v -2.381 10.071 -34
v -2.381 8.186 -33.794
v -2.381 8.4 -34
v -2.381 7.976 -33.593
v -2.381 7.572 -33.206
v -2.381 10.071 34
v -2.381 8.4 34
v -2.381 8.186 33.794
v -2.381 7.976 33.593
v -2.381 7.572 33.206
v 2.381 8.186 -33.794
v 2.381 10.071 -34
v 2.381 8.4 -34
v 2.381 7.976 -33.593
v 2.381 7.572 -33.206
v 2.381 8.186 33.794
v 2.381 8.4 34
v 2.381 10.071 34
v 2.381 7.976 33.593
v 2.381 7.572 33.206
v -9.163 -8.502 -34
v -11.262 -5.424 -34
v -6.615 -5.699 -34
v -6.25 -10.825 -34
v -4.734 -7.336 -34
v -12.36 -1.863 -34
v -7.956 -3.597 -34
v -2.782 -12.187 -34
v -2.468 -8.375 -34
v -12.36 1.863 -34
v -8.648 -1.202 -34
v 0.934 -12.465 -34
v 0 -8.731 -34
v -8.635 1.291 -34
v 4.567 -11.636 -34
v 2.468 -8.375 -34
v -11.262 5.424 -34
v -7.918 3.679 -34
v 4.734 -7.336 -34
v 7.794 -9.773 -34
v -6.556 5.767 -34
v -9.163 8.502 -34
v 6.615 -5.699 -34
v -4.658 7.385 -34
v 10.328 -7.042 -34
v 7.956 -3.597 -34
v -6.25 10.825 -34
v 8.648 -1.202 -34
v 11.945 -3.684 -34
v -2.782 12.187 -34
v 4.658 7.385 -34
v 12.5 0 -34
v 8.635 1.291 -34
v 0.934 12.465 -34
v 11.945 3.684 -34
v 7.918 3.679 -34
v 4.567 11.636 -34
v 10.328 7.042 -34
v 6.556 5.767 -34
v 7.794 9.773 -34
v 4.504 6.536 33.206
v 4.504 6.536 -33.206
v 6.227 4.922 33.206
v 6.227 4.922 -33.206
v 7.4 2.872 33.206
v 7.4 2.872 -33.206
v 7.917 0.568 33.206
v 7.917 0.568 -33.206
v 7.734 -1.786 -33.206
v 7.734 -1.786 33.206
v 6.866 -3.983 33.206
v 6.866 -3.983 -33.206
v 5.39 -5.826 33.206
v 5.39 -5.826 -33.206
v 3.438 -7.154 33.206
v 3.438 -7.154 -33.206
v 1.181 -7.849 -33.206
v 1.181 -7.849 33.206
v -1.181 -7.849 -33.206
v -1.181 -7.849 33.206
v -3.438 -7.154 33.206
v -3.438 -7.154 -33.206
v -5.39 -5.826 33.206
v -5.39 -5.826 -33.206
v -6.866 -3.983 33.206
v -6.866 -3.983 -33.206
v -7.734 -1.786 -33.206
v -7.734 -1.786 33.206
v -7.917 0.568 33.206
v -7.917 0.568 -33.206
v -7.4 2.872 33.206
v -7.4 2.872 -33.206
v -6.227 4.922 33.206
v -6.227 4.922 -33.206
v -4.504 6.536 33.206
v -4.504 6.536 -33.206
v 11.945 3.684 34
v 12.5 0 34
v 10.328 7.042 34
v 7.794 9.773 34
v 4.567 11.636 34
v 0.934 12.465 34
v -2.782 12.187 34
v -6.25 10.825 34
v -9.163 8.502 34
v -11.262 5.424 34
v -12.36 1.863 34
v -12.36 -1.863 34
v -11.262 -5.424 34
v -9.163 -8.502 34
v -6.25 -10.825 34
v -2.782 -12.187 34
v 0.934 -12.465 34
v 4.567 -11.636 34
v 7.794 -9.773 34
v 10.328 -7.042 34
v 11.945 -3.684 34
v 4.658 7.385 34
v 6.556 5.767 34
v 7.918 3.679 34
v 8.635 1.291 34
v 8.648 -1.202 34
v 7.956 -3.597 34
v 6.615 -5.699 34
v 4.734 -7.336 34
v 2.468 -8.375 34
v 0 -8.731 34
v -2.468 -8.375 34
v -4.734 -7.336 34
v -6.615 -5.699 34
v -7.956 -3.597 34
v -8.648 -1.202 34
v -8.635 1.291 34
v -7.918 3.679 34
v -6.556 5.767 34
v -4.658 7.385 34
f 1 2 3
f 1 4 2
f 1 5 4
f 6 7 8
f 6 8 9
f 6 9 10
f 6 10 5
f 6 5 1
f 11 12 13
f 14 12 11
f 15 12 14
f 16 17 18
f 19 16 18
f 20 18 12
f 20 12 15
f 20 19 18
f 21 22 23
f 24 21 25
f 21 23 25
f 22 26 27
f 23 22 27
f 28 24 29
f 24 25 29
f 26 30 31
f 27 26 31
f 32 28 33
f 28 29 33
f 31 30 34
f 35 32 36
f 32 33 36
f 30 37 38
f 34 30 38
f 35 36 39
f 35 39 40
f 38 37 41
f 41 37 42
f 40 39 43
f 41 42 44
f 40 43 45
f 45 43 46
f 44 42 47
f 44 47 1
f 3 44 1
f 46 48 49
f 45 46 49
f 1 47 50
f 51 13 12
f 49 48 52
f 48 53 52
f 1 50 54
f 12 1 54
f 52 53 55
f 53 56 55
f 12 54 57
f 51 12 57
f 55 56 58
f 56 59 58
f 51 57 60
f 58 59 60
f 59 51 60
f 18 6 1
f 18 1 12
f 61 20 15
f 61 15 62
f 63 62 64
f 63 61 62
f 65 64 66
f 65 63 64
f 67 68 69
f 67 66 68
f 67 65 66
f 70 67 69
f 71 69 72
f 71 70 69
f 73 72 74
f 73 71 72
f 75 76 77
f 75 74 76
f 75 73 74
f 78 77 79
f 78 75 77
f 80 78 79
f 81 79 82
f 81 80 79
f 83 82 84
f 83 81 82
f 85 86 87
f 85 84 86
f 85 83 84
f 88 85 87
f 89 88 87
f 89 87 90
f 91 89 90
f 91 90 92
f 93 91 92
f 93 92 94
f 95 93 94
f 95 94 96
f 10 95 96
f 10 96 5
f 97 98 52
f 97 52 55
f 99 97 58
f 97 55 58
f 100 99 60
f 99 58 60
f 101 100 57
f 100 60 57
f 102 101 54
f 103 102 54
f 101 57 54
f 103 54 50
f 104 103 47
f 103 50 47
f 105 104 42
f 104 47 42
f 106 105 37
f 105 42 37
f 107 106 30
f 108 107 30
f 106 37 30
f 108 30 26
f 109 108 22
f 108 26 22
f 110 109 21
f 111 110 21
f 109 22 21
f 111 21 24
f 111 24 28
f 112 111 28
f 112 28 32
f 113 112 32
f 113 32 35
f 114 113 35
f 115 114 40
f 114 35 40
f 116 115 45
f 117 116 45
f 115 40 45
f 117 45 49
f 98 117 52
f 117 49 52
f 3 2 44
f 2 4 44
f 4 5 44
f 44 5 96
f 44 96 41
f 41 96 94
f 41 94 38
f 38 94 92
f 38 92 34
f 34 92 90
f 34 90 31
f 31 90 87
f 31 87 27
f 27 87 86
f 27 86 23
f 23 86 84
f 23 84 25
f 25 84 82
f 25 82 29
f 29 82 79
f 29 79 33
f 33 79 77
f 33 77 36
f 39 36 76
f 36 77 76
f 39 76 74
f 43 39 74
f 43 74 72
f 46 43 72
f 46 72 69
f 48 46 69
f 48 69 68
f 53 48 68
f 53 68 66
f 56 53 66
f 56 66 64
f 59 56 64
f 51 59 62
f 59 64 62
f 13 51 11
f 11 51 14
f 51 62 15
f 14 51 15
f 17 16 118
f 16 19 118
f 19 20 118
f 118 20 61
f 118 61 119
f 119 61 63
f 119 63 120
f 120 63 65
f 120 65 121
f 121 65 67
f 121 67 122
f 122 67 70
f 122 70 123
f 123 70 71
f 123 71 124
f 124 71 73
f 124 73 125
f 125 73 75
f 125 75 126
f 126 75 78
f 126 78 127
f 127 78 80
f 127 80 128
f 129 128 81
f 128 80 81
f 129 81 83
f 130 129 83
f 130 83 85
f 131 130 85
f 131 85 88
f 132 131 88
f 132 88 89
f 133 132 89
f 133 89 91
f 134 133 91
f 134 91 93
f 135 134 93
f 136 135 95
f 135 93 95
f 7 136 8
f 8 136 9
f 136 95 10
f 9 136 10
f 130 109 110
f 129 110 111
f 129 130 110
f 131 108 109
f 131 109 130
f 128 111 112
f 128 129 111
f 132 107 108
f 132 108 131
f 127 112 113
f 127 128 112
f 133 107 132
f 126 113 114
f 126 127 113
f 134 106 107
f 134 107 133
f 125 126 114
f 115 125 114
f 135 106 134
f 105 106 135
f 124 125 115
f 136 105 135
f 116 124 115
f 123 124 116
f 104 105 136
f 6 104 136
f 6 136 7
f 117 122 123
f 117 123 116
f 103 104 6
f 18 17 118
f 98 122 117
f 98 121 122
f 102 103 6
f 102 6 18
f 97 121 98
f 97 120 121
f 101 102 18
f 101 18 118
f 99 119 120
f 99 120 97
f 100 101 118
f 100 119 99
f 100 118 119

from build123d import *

# Parameters (mm, degrees)
BOSS_EXTRUDE1_DEPTH      = 34
BOSS_EXTRUDE1_DEPTH_BACK = 34
SKETCH2_R                = 12.5
KEYWAY_DEPTH             = 71.525832556
CHAMFER1_SIZE            = 0.79375


with BuildPart() as part:
    # Sketch2 → Boss-Extrude1 (new, two sides: drawn at the far end of the back side and taken through both)
    with BuildSketch(Plane.XY.offset(-BOSS_EXTRUDE1_DEPTH_BACK)):
        Circle(SKETCH2_R)
    extrude(amount=BOSS_EXTRUDE1_DEPTH + BOSS_EXTRUDE1_DEPTH_BACK)

    # KeySketch → Keyway (cut, through all)
    with BuildSketch(Plane(origin=(-0.021590267, -1.396144607, 34), x_dir=(1, 0, 0), z_dir=(0, 0, 1))):
        with BuildLine():
            Line((-2.359659733, 8.968037019), (-2.359659733, 11.467244607))
            Line((-2.359659733, 11.467244607), (2.402840267, 11.467244607))
            Line((2.402840267, 11.467244607), (2.402840267, 8.968037019))
            ThreePointArc((2.402840267, 8.968037019), (0.021590267, -6.541355393), (-2.359659733, 8.968037019))
        make_face()
    extrude(amount=-KEYWAY_DEPTH, mode=Mode.SUBTRACT)

    # Chamfer1
    chamfer1_edges = [part.edges().sort_by_distance(p)[0] for p in [
        (0, -7.9375, -34),
        (0, -7.9375, 34),
    ]]
    chamfer(chamfer1_edges, length=CHAMFER1_SIZE)


solid = part.part
